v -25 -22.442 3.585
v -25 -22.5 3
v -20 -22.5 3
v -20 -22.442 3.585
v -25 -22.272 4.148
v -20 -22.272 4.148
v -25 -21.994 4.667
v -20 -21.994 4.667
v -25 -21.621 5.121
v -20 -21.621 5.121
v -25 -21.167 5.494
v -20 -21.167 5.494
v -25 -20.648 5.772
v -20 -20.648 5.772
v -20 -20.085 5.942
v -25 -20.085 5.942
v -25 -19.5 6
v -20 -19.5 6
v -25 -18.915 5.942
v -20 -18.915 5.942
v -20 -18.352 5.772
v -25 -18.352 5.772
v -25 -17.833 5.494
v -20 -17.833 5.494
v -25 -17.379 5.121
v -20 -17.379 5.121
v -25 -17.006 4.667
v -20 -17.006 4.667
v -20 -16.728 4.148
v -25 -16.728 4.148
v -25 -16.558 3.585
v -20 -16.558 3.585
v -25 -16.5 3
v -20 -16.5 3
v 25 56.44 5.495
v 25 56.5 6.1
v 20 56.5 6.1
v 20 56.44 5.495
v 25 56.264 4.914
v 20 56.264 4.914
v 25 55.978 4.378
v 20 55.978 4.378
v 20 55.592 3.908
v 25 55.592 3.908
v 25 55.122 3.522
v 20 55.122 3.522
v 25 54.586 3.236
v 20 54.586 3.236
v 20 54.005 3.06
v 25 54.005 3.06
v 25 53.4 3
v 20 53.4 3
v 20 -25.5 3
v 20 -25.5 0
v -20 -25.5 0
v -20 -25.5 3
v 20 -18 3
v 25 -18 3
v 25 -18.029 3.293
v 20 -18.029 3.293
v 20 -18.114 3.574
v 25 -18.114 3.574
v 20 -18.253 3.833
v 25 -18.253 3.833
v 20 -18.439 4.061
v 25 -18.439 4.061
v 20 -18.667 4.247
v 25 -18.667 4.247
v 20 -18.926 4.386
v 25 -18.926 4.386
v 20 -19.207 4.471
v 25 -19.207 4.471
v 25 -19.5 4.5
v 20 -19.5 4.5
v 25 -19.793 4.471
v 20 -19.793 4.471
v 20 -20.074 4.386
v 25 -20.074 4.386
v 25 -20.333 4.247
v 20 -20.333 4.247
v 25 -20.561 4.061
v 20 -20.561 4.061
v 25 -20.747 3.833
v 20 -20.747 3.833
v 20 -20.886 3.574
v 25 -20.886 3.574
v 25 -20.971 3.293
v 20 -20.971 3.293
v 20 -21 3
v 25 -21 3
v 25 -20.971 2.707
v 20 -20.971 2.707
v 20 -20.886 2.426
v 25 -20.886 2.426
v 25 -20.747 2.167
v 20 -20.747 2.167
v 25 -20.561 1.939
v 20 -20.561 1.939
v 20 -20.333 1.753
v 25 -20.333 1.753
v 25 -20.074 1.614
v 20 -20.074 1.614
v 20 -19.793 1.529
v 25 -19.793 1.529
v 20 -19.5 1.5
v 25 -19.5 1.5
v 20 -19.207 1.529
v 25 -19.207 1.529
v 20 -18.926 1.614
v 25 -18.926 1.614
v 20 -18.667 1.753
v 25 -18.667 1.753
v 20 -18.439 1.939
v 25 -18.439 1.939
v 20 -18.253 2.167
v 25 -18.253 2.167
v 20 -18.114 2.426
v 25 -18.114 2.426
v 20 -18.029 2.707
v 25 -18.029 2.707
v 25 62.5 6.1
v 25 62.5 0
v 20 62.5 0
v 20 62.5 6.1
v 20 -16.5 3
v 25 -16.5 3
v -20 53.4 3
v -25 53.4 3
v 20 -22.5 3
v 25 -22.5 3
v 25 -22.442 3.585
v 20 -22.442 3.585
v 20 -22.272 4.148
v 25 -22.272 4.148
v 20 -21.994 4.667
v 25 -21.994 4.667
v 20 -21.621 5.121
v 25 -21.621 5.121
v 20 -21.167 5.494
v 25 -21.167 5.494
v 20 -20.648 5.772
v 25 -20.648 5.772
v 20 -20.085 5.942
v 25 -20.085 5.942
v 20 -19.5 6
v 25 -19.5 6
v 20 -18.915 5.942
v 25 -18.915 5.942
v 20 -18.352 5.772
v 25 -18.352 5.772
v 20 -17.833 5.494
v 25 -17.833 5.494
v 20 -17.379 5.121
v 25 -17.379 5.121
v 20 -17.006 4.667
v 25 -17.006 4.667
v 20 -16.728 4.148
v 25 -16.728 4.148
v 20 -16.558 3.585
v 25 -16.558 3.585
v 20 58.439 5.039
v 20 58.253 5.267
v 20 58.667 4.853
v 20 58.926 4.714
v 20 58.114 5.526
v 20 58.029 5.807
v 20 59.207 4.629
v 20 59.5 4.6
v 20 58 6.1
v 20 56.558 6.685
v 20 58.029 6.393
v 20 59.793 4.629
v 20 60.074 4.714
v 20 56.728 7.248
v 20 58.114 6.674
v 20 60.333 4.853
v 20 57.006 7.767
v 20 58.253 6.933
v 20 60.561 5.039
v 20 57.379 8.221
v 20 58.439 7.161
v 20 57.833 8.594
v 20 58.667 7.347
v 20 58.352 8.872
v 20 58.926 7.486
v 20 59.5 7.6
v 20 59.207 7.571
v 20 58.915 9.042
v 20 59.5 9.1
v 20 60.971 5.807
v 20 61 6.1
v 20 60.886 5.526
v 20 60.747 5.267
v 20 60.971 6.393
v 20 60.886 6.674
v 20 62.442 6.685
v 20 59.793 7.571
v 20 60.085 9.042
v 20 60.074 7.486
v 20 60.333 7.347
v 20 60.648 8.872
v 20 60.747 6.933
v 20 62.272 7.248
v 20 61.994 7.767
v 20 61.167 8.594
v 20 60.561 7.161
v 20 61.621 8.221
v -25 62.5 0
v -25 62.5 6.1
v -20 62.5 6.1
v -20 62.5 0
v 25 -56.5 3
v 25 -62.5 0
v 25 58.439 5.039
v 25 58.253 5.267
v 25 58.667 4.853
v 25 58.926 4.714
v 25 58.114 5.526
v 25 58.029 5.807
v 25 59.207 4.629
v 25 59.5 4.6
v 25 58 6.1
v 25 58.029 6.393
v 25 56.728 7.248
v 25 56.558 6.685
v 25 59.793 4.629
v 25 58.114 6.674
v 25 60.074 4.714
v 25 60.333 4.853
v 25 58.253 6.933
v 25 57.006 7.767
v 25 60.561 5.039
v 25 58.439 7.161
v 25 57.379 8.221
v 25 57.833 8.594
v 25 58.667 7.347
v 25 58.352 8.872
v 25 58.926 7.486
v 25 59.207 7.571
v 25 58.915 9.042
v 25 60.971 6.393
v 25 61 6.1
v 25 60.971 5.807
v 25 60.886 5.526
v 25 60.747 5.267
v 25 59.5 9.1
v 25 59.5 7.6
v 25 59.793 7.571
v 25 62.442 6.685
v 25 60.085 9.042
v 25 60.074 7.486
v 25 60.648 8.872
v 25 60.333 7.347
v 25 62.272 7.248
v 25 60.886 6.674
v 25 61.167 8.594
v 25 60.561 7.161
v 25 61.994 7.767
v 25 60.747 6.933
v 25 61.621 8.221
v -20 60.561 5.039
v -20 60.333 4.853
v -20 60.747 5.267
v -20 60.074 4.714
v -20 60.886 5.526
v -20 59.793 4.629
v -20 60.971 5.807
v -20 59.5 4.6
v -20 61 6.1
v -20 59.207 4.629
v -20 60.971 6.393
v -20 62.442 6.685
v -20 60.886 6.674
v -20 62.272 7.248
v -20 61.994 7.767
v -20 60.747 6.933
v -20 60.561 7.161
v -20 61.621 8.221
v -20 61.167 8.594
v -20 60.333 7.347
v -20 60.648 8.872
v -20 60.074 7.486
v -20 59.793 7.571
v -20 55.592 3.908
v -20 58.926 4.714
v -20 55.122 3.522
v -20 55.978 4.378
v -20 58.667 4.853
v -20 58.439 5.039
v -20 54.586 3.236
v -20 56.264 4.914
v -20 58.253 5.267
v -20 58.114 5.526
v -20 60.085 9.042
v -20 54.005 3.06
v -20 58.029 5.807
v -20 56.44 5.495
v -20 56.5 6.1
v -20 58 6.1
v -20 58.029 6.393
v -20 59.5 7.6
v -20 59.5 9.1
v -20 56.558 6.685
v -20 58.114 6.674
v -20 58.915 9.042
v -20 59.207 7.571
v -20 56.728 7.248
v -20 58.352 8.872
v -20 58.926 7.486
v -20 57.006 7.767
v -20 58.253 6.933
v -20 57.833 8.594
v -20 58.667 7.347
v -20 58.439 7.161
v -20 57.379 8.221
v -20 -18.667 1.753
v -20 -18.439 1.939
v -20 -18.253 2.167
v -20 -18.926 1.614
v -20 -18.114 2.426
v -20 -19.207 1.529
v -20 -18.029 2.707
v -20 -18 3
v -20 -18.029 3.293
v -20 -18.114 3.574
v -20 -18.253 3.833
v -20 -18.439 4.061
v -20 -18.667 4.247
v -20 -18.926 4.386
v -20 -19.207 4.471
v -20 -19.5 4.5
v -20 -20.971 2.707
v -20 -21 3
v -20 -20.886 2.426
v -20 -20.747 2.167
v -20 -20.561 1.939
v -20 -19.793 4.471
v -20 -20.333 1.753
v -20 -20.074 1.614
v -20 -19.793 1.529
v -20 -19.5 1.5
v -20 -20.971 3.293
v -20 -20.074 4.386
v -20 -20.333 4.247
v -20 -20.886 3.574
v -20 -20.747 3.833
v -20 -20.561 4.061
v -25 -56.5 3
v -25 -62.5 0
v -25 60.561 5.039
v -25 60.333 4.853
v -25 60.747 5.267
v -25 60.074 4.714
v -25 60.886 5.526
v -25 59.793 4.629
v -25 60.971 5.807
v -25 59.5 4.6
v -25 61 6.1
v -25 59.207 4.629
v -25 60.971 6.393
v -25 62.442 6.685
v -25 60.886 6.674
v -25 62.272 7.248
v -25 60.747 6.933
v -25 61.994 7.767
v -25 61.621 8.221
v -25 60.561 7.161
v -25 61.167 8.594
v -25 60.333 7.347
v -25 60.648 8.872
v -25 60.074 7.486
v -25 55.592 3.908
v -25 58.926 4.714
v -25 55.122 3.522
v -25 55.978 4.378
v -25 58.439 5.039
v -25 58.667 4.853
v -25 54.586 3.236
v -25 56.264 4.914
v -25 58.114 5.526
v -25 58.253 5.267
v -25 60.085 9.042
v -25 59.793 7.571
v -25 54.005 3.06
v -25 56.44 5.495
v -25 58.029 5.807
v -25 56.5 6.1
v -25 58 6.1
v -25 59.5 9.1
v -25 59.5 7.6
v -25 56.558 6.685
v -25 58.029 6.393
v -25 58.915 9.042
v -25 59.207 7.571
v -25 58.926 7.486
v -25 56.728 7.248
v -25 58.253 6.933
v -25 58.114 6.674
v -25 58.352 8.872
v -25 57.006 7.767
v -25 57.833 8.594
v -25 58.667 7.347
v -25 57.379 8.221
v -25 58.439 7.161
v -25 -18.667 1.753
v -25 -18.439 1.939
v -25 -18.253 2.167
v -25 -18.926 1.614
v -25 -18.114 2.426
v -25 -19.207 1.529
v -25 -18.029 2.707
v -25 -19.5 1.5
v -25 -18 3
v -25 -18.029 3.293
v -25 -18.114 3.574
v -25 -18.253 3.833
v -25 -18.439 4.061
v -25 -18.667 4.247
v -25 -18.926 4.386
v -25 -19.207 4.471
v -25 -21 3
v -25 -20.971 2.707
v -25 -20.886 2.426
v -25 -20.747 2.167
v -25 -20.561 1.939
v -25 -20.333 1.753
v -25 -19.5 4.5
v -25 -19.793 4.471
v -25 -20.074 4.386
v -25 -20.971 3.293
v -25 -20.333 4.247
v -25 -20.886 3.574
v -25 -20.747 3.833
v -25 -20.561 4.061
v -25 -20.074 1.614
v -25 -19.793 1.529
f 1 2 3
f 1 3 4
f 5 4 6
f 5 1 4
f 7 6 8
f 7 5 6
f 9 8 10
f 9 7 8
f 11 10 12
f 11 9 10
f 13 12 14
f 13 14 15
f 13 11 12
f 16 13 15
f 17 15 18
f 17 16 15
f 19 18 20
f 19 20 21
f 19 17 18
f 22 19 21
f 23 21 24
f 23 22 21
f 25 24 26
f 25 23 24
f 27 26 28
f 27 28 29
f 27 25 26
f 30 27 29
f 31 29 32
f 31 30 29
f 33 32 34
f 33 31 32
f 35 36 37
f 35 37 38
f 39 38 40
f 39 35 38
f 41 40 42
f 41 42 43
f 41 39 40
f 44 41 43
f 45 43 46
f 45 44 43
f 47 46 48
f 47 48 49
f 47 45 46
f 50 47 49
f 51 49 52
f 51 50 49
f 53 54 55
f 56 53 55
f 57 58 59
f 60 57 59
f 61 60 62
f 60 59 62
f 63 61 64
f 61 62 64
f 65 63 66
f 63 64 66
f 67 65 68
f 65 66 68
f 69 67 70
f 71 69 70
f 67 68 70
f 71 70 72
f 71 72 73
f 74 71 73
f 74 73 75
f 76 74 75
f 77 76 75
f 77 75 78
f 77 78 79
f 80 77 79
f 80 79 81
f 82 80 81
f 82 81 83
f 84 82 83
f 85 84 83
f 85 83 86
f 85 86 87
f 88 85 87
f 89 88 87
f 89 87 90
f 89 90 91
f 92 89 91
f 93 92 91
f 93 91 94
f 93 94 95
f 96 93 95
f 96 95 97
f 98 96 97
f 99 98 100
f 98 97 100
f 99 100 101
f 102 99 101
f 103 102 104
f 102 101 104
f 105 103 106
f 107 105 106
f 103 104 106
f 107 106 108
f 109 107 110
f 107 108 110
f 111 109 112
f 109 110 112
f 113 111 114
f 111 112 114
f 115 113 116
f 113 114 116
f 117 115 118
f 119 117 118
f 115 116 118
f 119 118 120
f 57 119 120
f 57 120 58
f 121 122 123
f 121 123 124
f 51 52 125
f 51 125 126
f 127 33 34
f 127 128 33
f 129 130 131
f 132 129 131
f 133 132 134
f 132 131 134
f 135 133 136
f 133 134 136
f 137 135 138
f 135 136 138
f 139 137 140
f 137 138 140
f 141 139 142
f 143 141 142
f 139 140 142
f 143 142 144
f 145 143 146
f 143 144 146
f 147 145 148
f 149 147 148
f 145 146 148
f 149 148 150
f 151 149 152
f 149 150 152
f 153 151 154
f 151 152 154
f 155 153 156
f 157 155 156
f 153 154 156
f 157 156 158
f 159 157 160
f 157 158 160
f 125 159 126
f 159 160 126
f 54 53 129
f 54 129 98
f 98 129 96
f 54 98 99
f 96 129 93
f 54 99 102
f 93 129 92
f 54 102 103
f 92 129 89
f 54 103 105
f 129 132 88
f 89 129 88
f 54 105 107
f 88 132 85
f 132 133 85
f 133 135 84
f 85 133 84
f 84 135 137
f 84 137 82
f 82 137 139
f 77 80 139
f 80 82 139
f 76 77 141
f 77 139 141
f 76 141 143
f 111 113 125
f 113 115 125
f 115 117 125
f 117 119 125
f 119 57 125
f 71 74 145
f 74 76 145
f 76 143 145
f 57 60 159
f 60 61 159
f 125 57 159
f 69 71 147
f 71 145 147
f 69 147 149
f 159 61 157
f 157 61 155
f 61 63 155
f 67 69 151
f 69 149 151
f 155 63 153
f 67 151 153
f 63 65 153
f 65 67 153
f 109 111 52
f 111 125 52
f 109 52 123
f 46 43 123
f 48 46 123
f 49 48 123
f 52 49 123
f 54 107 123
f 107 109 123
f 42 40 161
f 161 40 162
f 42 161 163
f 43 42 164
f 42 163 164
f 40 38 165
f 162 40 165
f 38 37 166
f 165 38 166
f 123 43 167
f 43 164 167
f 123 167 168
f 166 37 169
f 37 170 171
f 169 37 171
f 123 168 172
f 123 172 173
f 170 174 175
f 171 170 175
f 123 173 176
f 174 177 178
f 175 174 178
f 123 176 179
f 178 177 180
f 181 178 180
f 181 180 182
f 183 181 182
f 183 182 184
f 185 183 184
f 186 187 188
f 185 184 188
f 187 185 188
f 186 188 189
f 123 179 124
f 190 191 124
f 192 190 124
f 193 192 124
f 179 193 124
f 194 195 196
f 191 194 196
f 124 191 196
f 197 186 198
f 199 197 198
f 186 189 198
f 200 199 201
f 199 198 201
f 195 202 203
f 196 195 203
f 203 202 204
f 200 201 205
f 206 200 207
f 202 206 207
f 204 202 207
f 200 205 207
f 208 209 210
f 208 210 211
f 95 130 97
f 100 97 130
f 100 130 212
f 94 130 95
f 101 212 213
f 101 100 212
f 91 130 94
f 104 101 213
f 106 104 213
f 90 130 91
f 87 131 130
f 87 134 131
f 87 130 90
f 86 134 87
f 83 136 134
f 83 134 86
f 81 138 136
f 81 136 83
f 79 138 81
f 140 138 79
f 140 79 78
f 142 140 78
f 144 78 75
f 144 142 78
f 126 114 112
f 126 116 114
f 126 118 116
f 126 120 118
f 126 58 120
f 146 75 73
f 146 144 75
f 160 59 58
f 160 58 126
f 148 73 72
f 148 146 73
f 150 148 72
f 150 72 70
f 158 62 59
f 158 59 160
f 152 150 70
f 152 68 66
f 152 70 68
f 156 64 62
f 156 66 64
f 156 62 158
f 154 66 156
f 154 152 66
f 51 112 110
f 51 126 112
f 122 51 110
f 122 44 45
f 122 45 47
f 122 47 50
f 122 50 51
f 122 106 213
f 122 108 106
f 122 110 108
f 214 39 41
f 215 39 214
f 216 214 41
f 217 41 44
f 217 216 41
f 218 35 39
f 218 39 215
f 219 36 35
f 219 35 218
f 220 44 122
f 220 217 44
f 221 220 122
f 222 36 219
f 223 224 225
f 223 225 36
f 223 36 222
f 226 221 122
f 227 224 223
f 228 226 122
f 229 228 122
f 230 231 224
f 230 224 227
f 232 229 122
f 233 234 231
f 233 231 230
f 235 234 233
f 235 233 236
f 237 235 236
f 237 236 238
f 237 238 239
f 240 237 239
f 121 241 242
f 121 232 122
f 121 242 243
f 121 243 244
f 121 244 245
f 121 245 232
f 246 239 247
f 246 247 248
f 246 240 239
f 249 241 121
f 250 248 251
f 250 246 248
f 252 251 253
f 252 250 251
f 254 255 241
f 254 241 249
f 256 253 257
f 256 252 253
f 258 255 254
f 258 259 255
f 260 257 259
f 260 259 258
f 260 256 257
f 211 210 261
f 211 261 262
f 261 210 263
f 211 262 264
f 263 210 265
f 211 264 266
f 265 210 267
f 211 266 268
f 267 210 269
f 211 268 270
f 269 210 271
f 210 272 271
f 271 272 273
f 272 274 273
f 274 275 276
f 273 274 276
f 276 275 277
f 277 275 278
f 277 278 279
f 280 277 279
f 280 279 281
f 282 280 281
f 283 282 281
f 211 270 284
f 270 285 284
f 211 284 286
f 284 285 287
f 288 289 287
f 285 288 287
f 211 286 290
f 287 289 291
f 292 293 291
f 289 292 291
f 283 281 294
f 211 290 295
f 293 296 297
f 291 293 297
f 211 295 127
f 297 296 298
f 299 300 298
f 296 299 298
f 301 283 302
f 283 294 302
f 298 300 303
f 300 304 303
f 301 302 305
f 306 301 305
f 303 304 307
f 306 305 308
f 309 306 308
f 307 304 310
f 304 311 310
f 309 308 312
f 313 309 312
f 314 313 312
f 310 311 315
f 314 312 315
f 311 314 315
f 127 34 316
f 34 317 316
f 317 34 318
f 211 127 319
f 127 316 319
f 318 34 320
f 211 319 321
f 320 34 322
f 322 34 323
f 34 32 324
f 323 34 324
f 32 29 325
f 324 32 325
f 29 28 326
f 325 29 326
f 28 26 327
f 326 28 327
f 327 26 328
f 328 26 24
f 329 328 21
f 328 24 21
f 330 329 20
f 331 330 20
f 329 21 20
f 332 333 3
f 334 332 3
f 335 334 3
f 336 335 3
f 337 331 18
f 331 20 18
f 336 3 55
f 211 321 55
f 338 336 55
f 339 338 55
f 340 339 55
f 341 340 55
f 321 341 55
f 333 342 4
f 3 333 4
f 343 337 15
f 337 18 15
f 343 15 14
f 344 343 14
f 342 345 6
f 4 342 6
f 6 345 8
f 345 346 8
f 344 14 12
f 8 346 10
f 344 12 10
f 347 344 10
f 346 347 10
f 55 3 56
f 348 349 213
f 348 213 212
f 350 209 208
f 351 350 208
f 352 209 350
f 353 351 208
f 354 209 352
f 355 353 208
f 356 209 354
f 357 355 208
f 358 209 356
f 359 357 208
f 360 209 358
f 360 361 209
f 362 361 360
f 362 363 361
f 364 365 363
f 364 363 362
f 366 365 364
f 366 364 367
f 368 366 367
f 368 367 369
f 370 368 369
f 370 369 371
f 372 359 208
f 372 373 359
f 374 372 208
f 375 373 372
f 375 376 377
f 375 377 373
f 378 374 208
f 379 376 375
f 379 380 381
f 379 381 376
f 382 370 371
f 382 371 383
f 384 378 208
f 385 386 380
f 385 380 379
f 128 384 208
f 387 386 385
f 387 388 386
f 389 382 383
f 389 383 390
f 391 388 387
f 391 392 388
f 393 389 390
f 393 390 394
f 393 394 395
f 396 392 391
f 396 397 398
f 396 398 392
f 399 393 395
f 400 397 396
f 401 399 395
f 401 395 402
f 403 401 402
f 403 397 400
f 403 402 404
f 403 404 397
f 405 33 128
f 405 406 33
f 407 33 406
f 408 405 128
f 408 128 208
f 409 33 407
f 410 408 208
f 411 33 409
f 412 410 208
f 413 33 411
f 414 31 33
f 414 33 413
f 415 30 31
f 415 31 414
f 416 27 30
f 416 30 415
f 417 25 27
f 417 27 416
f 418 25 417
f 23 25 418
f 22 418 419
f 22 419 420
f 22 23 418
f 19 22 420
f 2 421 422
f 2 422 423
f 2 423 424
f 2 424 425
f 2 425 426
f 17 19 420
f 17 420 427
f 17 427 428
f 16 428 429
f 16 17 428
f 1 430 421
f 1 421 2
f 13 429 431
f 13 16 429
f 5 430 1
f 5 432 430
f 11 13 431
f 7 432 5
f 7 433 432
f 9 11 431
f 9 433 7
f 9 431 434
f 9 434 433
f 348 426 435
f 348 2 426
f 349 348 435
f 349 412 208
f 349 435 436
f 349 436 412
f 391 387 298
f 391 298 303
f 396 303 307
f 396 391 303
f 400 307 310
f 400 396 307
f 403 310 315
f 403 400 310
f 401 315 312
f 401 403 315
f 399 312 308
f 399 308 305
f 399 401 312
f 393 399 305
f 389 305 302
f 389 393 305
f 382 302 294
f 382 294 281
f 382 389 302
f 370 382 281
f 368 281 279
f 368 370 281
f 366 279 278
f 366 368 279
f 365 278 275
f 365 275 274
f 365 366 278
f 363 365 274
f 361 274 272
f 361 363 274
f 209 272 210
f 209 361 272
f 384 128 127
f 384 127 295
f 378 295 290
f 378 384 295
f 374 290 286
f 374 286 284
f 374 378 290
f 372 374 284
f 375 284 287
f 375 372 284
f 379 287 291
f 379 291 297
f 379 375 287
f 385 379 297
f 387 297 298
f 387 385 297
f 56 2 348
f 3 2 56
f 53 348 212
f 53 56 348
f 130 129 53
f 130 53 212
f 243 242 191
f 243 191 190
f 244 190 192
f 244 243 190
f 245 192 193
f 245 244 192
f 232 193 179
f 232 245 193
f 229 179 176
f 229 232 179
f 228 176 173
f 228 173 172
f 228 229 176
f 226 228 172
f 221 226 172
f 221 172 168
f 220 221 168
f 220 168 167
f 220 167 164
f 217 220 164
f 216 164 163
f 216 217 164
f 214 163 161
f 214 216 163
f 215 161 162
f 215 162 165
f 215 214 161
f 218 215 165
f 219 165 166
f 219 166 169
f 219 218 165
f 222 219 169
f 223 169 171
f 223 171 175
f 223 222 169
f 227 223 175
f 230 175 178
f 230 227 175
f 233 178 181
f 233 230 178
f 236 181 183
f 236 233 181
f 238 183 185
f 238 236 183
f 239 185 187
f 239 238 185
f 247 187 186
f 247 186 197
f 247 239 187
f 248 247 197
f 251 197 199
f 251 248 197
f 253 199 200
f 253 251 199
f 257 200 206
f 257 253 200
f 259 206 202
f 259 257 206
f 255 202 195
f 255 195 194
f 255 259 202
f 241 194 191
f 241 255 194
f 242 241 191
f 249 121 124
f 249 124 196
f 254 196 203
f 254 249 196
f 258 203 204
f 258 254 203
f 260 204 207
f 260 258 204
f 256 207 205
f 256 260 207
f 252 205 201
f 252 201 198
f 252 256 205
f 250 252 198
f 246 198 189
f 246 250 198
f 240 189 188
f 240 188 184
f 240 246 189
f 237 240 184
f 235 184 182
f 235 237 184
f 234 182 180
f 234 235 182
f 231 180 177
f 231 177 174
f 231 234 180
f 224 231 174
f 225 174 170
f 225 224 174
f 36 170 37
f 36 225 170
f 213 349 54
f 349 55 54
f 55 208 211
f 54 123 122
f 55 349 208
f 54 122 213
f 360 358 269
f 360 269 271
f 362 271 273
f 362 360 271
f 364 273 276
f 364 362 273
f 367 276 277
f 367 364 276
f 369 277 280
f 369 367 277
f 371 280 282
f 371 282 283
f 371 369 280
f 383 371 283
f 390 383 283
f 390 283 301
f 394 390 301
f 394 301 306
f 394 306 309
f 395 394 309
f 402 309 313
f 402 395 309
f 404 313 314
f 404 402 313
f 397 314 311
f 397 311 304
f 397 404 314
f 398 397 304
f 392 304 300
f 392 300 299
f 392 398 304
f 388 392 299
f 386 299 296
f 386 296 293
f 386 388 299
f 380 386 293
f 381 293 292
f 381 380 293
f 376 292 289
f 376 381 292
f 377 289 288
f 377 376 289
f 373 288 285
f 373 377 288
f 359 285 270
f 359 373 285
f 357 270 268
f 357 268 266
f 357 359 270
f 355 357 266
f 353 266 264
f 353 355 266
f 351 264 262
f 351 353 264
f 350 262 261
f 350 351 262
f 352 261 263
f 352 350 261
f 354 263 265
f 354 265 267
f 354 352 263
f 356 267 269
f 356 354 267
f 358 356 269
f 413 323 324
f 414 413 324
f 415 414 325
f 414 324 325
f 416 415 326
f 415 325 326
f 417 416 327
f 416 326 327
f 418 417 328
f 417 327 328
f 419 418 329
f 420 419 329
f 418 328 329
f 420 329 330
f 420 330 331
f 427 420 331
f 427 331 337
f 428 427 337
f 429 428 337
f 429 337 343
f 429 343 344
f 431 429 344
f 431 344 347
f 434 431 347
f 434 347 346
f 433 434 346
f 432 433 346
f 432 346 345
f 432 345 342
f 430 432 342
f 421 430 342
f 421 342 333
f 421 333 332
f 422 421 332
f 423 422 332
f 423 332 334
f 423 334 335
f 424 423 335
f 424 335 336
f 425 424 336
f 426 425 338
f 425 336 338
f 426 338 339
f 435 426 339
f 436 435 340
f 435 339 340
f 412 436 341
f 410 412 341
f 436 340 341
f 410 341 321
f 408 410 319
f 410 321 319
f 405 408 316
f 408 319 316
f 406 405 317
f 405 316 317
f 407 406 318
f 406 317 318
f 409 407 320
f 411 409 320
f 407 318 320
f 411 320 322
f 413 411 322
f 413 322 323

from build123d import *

# Parameters (mm, degrees)
F1_DEPTH  = 3
F3_DEPTH  = 5
F5_DEPTH  = 5
F7_DEPTH  = 5
F9_DEPTH  = 5
F11_R     = 1.5
F12_DEPTH = 55
F14_DEPTH = 100


# Not quite as in the source:
# - a pattern or mirror of a feature is missing from the dataset's text; its kind, count and spacing are read off the source's solid
# - a feature names something its author has since deleted; it is built from what else it names


with BuildPart() as f1:
    # F0 (on Top) → F1 (new body)
    with BuildSketch(Plane.XY):
        Polygon((-20, 62.5), (-25, 62.5), (-25, -62.5), (25, -62.5), (25, 62.5), (20, 62.5), (20, -25.5), (-20, -25.5), align=None)
    extrude(amount=F1_DEPTH)

    # F4 (on face) → F5 (join)
    with BuildSketch(Plane(origin=(-25, 0, 0), x_dir=(0, -1, 0), z_dir=(-1, 0, 0))):
        with BuildLine():
            Line((16.5, 3), (22.5, 3))
            ThreePointArc((22.5, 3), (19.5, 6), (16.5, 3))
        make_face()
    f5 = extrude(amount=-F5_DEPTH)

    # F5_copies: F5 across plane
    add(f5.mirror(Plane(origin=(0, 0, 0), x_dir=(0, 0, 1), z_dir=(1, 0, 0))))

    # F6 (on face) → F7 (join)
    with BuildSketch(Plane(origin=(-25, 0, 0), x_dir=(0, -1, 0), z_dir=(-1, 0, 0))):
        with BuildLine():
            Line((-62.5, 6.1), (-62.5, 3))
            Line((-62.5, 3), (-56.5, 3))
            Line((-56.5, 3), (-56.5, 6.1))
            ThreePointArc((-56.5, 6.1), (-59.5, 3.1), (-62.5, 6.1))
        make_face()
        with BuildLine():
            ThreePointArc((-56.5, 6.1), (-59.5, 9.1), (-62.5, 6.1))
            Line((-62.5, 6.1), (-61, 6.1))
            ThreePointArc((-61, 6.1), (-59.5, 7.6), (-58, 6.1))
            Line((-58, 6.1), (-56.5, 6.1))
        make_face()
        with BuildLine():
            Line((-56.5, 6.1), (-56.5, 3))
            Line((-56.5, 3), (-53.4, 3))
            ThreePointArc((-53.4, 3), (-55.5920310217, 3.9079689783), (-56.5, 6.1))
        make_face()
        with BuildLine():
            Line((-61, 6.1), (-62.5, 6.1))
            ThreePointArc((-62.5, 6.1), (-59.5, 3.1), (-56.5, 6.1))
            Line((-56.5, 6.1), (-58, 6.1))
            ThreePointArc((-58, 6.1), (-59.5, 4.6), (-61, 6.1))
        make_face()
    extrude(amount=-F7_DEPTH)

    # F8 (on face) → F9 (join)
    with BuildSketch(Plane.YZ.offset(25)):
        with BuildLine():
            Line((61, 6.1), (62.5, 6.1))
            ThreePointArc((62.5, 6.1), (59.5, 9.1), (56.5, 6.1))
            Line((56.5, 6.1), (58, 6.1))
            ThreePointArc((58, 6.1), (59.5, 7.6), (61, 6.1))
        make_face()
        with BuildLine():
            Line((56.5, 3), (62.5, 3))
            Line((62.5, 3), (62.5, 6.1))
            ThreePointArc((62.5, 6.1), (59.5, 3.1), (56.5, 6.1))
            Line((56.5, 6.1), (56.5, 3))
        make_face()
        with BuildLine():
            Line((53.4, 3), (56.5, 3))
            Line((56.5, 3), (56.5, 6.1))
            ThreePointArc((56.5, 6.1), (55.5920310217, 3.9079689783), (53.4, 3))
        make_face()
        with BuildLine():
            ThreePointArc((56.5, 6.1), (59.5, 3.1), (62.5, 6.1))
            Line((62.5, 6.1), (61, 6.1))
            ThreePointArc((61, 6.1), (59.5, 4.6), (58, 6.1))
            Line((58, 6.1), (56.5, 6.1))
        make_face()
    extrude(amount=-F9_DEPTH)


with BuildPart() as f3:
    # F2 (on face) → F3 (new body)
    with BuildSketch(Plane.YZ.offset(25)):
        with BuildLine():
            ThreePointArc((-19.5000000146, 0), (-17.3786796616, 0.8786796513), (-16.5, 3))
            Line((-16.5, 3), (-22.5, 3))
            ThreePointArc((-22.5, 3), (-21.6213203487, 0.8786796616), (-19.5000000146, 0))
        make_face()
    extrude(amount=-F3_DEPTH)


with BuildPart() as f1_1:
    add(f1.part)

    # F10: union F3
    add(f3.part)

    # F11 (on face) → F12 (cut)
    with BuildSketch(Plane.YZ.offset(25)):
        with Locations((-19.5, 3)):
            Circle(F11_R)
    extrude(amount=-F12_DEPTH, mode=Mode.SUBTRACT)

    # F13 (on face) → F14 (cut)
    with BuildSketch(Plane.YZ.offset(25)):
        Polygon((-62.5, 3), (-62.5, 0), (-56.5, 3), align=None)
    extrude(amount=-F14_DEPTH, mode=Mode.SUBTRACT)


solid = f1_1.part
